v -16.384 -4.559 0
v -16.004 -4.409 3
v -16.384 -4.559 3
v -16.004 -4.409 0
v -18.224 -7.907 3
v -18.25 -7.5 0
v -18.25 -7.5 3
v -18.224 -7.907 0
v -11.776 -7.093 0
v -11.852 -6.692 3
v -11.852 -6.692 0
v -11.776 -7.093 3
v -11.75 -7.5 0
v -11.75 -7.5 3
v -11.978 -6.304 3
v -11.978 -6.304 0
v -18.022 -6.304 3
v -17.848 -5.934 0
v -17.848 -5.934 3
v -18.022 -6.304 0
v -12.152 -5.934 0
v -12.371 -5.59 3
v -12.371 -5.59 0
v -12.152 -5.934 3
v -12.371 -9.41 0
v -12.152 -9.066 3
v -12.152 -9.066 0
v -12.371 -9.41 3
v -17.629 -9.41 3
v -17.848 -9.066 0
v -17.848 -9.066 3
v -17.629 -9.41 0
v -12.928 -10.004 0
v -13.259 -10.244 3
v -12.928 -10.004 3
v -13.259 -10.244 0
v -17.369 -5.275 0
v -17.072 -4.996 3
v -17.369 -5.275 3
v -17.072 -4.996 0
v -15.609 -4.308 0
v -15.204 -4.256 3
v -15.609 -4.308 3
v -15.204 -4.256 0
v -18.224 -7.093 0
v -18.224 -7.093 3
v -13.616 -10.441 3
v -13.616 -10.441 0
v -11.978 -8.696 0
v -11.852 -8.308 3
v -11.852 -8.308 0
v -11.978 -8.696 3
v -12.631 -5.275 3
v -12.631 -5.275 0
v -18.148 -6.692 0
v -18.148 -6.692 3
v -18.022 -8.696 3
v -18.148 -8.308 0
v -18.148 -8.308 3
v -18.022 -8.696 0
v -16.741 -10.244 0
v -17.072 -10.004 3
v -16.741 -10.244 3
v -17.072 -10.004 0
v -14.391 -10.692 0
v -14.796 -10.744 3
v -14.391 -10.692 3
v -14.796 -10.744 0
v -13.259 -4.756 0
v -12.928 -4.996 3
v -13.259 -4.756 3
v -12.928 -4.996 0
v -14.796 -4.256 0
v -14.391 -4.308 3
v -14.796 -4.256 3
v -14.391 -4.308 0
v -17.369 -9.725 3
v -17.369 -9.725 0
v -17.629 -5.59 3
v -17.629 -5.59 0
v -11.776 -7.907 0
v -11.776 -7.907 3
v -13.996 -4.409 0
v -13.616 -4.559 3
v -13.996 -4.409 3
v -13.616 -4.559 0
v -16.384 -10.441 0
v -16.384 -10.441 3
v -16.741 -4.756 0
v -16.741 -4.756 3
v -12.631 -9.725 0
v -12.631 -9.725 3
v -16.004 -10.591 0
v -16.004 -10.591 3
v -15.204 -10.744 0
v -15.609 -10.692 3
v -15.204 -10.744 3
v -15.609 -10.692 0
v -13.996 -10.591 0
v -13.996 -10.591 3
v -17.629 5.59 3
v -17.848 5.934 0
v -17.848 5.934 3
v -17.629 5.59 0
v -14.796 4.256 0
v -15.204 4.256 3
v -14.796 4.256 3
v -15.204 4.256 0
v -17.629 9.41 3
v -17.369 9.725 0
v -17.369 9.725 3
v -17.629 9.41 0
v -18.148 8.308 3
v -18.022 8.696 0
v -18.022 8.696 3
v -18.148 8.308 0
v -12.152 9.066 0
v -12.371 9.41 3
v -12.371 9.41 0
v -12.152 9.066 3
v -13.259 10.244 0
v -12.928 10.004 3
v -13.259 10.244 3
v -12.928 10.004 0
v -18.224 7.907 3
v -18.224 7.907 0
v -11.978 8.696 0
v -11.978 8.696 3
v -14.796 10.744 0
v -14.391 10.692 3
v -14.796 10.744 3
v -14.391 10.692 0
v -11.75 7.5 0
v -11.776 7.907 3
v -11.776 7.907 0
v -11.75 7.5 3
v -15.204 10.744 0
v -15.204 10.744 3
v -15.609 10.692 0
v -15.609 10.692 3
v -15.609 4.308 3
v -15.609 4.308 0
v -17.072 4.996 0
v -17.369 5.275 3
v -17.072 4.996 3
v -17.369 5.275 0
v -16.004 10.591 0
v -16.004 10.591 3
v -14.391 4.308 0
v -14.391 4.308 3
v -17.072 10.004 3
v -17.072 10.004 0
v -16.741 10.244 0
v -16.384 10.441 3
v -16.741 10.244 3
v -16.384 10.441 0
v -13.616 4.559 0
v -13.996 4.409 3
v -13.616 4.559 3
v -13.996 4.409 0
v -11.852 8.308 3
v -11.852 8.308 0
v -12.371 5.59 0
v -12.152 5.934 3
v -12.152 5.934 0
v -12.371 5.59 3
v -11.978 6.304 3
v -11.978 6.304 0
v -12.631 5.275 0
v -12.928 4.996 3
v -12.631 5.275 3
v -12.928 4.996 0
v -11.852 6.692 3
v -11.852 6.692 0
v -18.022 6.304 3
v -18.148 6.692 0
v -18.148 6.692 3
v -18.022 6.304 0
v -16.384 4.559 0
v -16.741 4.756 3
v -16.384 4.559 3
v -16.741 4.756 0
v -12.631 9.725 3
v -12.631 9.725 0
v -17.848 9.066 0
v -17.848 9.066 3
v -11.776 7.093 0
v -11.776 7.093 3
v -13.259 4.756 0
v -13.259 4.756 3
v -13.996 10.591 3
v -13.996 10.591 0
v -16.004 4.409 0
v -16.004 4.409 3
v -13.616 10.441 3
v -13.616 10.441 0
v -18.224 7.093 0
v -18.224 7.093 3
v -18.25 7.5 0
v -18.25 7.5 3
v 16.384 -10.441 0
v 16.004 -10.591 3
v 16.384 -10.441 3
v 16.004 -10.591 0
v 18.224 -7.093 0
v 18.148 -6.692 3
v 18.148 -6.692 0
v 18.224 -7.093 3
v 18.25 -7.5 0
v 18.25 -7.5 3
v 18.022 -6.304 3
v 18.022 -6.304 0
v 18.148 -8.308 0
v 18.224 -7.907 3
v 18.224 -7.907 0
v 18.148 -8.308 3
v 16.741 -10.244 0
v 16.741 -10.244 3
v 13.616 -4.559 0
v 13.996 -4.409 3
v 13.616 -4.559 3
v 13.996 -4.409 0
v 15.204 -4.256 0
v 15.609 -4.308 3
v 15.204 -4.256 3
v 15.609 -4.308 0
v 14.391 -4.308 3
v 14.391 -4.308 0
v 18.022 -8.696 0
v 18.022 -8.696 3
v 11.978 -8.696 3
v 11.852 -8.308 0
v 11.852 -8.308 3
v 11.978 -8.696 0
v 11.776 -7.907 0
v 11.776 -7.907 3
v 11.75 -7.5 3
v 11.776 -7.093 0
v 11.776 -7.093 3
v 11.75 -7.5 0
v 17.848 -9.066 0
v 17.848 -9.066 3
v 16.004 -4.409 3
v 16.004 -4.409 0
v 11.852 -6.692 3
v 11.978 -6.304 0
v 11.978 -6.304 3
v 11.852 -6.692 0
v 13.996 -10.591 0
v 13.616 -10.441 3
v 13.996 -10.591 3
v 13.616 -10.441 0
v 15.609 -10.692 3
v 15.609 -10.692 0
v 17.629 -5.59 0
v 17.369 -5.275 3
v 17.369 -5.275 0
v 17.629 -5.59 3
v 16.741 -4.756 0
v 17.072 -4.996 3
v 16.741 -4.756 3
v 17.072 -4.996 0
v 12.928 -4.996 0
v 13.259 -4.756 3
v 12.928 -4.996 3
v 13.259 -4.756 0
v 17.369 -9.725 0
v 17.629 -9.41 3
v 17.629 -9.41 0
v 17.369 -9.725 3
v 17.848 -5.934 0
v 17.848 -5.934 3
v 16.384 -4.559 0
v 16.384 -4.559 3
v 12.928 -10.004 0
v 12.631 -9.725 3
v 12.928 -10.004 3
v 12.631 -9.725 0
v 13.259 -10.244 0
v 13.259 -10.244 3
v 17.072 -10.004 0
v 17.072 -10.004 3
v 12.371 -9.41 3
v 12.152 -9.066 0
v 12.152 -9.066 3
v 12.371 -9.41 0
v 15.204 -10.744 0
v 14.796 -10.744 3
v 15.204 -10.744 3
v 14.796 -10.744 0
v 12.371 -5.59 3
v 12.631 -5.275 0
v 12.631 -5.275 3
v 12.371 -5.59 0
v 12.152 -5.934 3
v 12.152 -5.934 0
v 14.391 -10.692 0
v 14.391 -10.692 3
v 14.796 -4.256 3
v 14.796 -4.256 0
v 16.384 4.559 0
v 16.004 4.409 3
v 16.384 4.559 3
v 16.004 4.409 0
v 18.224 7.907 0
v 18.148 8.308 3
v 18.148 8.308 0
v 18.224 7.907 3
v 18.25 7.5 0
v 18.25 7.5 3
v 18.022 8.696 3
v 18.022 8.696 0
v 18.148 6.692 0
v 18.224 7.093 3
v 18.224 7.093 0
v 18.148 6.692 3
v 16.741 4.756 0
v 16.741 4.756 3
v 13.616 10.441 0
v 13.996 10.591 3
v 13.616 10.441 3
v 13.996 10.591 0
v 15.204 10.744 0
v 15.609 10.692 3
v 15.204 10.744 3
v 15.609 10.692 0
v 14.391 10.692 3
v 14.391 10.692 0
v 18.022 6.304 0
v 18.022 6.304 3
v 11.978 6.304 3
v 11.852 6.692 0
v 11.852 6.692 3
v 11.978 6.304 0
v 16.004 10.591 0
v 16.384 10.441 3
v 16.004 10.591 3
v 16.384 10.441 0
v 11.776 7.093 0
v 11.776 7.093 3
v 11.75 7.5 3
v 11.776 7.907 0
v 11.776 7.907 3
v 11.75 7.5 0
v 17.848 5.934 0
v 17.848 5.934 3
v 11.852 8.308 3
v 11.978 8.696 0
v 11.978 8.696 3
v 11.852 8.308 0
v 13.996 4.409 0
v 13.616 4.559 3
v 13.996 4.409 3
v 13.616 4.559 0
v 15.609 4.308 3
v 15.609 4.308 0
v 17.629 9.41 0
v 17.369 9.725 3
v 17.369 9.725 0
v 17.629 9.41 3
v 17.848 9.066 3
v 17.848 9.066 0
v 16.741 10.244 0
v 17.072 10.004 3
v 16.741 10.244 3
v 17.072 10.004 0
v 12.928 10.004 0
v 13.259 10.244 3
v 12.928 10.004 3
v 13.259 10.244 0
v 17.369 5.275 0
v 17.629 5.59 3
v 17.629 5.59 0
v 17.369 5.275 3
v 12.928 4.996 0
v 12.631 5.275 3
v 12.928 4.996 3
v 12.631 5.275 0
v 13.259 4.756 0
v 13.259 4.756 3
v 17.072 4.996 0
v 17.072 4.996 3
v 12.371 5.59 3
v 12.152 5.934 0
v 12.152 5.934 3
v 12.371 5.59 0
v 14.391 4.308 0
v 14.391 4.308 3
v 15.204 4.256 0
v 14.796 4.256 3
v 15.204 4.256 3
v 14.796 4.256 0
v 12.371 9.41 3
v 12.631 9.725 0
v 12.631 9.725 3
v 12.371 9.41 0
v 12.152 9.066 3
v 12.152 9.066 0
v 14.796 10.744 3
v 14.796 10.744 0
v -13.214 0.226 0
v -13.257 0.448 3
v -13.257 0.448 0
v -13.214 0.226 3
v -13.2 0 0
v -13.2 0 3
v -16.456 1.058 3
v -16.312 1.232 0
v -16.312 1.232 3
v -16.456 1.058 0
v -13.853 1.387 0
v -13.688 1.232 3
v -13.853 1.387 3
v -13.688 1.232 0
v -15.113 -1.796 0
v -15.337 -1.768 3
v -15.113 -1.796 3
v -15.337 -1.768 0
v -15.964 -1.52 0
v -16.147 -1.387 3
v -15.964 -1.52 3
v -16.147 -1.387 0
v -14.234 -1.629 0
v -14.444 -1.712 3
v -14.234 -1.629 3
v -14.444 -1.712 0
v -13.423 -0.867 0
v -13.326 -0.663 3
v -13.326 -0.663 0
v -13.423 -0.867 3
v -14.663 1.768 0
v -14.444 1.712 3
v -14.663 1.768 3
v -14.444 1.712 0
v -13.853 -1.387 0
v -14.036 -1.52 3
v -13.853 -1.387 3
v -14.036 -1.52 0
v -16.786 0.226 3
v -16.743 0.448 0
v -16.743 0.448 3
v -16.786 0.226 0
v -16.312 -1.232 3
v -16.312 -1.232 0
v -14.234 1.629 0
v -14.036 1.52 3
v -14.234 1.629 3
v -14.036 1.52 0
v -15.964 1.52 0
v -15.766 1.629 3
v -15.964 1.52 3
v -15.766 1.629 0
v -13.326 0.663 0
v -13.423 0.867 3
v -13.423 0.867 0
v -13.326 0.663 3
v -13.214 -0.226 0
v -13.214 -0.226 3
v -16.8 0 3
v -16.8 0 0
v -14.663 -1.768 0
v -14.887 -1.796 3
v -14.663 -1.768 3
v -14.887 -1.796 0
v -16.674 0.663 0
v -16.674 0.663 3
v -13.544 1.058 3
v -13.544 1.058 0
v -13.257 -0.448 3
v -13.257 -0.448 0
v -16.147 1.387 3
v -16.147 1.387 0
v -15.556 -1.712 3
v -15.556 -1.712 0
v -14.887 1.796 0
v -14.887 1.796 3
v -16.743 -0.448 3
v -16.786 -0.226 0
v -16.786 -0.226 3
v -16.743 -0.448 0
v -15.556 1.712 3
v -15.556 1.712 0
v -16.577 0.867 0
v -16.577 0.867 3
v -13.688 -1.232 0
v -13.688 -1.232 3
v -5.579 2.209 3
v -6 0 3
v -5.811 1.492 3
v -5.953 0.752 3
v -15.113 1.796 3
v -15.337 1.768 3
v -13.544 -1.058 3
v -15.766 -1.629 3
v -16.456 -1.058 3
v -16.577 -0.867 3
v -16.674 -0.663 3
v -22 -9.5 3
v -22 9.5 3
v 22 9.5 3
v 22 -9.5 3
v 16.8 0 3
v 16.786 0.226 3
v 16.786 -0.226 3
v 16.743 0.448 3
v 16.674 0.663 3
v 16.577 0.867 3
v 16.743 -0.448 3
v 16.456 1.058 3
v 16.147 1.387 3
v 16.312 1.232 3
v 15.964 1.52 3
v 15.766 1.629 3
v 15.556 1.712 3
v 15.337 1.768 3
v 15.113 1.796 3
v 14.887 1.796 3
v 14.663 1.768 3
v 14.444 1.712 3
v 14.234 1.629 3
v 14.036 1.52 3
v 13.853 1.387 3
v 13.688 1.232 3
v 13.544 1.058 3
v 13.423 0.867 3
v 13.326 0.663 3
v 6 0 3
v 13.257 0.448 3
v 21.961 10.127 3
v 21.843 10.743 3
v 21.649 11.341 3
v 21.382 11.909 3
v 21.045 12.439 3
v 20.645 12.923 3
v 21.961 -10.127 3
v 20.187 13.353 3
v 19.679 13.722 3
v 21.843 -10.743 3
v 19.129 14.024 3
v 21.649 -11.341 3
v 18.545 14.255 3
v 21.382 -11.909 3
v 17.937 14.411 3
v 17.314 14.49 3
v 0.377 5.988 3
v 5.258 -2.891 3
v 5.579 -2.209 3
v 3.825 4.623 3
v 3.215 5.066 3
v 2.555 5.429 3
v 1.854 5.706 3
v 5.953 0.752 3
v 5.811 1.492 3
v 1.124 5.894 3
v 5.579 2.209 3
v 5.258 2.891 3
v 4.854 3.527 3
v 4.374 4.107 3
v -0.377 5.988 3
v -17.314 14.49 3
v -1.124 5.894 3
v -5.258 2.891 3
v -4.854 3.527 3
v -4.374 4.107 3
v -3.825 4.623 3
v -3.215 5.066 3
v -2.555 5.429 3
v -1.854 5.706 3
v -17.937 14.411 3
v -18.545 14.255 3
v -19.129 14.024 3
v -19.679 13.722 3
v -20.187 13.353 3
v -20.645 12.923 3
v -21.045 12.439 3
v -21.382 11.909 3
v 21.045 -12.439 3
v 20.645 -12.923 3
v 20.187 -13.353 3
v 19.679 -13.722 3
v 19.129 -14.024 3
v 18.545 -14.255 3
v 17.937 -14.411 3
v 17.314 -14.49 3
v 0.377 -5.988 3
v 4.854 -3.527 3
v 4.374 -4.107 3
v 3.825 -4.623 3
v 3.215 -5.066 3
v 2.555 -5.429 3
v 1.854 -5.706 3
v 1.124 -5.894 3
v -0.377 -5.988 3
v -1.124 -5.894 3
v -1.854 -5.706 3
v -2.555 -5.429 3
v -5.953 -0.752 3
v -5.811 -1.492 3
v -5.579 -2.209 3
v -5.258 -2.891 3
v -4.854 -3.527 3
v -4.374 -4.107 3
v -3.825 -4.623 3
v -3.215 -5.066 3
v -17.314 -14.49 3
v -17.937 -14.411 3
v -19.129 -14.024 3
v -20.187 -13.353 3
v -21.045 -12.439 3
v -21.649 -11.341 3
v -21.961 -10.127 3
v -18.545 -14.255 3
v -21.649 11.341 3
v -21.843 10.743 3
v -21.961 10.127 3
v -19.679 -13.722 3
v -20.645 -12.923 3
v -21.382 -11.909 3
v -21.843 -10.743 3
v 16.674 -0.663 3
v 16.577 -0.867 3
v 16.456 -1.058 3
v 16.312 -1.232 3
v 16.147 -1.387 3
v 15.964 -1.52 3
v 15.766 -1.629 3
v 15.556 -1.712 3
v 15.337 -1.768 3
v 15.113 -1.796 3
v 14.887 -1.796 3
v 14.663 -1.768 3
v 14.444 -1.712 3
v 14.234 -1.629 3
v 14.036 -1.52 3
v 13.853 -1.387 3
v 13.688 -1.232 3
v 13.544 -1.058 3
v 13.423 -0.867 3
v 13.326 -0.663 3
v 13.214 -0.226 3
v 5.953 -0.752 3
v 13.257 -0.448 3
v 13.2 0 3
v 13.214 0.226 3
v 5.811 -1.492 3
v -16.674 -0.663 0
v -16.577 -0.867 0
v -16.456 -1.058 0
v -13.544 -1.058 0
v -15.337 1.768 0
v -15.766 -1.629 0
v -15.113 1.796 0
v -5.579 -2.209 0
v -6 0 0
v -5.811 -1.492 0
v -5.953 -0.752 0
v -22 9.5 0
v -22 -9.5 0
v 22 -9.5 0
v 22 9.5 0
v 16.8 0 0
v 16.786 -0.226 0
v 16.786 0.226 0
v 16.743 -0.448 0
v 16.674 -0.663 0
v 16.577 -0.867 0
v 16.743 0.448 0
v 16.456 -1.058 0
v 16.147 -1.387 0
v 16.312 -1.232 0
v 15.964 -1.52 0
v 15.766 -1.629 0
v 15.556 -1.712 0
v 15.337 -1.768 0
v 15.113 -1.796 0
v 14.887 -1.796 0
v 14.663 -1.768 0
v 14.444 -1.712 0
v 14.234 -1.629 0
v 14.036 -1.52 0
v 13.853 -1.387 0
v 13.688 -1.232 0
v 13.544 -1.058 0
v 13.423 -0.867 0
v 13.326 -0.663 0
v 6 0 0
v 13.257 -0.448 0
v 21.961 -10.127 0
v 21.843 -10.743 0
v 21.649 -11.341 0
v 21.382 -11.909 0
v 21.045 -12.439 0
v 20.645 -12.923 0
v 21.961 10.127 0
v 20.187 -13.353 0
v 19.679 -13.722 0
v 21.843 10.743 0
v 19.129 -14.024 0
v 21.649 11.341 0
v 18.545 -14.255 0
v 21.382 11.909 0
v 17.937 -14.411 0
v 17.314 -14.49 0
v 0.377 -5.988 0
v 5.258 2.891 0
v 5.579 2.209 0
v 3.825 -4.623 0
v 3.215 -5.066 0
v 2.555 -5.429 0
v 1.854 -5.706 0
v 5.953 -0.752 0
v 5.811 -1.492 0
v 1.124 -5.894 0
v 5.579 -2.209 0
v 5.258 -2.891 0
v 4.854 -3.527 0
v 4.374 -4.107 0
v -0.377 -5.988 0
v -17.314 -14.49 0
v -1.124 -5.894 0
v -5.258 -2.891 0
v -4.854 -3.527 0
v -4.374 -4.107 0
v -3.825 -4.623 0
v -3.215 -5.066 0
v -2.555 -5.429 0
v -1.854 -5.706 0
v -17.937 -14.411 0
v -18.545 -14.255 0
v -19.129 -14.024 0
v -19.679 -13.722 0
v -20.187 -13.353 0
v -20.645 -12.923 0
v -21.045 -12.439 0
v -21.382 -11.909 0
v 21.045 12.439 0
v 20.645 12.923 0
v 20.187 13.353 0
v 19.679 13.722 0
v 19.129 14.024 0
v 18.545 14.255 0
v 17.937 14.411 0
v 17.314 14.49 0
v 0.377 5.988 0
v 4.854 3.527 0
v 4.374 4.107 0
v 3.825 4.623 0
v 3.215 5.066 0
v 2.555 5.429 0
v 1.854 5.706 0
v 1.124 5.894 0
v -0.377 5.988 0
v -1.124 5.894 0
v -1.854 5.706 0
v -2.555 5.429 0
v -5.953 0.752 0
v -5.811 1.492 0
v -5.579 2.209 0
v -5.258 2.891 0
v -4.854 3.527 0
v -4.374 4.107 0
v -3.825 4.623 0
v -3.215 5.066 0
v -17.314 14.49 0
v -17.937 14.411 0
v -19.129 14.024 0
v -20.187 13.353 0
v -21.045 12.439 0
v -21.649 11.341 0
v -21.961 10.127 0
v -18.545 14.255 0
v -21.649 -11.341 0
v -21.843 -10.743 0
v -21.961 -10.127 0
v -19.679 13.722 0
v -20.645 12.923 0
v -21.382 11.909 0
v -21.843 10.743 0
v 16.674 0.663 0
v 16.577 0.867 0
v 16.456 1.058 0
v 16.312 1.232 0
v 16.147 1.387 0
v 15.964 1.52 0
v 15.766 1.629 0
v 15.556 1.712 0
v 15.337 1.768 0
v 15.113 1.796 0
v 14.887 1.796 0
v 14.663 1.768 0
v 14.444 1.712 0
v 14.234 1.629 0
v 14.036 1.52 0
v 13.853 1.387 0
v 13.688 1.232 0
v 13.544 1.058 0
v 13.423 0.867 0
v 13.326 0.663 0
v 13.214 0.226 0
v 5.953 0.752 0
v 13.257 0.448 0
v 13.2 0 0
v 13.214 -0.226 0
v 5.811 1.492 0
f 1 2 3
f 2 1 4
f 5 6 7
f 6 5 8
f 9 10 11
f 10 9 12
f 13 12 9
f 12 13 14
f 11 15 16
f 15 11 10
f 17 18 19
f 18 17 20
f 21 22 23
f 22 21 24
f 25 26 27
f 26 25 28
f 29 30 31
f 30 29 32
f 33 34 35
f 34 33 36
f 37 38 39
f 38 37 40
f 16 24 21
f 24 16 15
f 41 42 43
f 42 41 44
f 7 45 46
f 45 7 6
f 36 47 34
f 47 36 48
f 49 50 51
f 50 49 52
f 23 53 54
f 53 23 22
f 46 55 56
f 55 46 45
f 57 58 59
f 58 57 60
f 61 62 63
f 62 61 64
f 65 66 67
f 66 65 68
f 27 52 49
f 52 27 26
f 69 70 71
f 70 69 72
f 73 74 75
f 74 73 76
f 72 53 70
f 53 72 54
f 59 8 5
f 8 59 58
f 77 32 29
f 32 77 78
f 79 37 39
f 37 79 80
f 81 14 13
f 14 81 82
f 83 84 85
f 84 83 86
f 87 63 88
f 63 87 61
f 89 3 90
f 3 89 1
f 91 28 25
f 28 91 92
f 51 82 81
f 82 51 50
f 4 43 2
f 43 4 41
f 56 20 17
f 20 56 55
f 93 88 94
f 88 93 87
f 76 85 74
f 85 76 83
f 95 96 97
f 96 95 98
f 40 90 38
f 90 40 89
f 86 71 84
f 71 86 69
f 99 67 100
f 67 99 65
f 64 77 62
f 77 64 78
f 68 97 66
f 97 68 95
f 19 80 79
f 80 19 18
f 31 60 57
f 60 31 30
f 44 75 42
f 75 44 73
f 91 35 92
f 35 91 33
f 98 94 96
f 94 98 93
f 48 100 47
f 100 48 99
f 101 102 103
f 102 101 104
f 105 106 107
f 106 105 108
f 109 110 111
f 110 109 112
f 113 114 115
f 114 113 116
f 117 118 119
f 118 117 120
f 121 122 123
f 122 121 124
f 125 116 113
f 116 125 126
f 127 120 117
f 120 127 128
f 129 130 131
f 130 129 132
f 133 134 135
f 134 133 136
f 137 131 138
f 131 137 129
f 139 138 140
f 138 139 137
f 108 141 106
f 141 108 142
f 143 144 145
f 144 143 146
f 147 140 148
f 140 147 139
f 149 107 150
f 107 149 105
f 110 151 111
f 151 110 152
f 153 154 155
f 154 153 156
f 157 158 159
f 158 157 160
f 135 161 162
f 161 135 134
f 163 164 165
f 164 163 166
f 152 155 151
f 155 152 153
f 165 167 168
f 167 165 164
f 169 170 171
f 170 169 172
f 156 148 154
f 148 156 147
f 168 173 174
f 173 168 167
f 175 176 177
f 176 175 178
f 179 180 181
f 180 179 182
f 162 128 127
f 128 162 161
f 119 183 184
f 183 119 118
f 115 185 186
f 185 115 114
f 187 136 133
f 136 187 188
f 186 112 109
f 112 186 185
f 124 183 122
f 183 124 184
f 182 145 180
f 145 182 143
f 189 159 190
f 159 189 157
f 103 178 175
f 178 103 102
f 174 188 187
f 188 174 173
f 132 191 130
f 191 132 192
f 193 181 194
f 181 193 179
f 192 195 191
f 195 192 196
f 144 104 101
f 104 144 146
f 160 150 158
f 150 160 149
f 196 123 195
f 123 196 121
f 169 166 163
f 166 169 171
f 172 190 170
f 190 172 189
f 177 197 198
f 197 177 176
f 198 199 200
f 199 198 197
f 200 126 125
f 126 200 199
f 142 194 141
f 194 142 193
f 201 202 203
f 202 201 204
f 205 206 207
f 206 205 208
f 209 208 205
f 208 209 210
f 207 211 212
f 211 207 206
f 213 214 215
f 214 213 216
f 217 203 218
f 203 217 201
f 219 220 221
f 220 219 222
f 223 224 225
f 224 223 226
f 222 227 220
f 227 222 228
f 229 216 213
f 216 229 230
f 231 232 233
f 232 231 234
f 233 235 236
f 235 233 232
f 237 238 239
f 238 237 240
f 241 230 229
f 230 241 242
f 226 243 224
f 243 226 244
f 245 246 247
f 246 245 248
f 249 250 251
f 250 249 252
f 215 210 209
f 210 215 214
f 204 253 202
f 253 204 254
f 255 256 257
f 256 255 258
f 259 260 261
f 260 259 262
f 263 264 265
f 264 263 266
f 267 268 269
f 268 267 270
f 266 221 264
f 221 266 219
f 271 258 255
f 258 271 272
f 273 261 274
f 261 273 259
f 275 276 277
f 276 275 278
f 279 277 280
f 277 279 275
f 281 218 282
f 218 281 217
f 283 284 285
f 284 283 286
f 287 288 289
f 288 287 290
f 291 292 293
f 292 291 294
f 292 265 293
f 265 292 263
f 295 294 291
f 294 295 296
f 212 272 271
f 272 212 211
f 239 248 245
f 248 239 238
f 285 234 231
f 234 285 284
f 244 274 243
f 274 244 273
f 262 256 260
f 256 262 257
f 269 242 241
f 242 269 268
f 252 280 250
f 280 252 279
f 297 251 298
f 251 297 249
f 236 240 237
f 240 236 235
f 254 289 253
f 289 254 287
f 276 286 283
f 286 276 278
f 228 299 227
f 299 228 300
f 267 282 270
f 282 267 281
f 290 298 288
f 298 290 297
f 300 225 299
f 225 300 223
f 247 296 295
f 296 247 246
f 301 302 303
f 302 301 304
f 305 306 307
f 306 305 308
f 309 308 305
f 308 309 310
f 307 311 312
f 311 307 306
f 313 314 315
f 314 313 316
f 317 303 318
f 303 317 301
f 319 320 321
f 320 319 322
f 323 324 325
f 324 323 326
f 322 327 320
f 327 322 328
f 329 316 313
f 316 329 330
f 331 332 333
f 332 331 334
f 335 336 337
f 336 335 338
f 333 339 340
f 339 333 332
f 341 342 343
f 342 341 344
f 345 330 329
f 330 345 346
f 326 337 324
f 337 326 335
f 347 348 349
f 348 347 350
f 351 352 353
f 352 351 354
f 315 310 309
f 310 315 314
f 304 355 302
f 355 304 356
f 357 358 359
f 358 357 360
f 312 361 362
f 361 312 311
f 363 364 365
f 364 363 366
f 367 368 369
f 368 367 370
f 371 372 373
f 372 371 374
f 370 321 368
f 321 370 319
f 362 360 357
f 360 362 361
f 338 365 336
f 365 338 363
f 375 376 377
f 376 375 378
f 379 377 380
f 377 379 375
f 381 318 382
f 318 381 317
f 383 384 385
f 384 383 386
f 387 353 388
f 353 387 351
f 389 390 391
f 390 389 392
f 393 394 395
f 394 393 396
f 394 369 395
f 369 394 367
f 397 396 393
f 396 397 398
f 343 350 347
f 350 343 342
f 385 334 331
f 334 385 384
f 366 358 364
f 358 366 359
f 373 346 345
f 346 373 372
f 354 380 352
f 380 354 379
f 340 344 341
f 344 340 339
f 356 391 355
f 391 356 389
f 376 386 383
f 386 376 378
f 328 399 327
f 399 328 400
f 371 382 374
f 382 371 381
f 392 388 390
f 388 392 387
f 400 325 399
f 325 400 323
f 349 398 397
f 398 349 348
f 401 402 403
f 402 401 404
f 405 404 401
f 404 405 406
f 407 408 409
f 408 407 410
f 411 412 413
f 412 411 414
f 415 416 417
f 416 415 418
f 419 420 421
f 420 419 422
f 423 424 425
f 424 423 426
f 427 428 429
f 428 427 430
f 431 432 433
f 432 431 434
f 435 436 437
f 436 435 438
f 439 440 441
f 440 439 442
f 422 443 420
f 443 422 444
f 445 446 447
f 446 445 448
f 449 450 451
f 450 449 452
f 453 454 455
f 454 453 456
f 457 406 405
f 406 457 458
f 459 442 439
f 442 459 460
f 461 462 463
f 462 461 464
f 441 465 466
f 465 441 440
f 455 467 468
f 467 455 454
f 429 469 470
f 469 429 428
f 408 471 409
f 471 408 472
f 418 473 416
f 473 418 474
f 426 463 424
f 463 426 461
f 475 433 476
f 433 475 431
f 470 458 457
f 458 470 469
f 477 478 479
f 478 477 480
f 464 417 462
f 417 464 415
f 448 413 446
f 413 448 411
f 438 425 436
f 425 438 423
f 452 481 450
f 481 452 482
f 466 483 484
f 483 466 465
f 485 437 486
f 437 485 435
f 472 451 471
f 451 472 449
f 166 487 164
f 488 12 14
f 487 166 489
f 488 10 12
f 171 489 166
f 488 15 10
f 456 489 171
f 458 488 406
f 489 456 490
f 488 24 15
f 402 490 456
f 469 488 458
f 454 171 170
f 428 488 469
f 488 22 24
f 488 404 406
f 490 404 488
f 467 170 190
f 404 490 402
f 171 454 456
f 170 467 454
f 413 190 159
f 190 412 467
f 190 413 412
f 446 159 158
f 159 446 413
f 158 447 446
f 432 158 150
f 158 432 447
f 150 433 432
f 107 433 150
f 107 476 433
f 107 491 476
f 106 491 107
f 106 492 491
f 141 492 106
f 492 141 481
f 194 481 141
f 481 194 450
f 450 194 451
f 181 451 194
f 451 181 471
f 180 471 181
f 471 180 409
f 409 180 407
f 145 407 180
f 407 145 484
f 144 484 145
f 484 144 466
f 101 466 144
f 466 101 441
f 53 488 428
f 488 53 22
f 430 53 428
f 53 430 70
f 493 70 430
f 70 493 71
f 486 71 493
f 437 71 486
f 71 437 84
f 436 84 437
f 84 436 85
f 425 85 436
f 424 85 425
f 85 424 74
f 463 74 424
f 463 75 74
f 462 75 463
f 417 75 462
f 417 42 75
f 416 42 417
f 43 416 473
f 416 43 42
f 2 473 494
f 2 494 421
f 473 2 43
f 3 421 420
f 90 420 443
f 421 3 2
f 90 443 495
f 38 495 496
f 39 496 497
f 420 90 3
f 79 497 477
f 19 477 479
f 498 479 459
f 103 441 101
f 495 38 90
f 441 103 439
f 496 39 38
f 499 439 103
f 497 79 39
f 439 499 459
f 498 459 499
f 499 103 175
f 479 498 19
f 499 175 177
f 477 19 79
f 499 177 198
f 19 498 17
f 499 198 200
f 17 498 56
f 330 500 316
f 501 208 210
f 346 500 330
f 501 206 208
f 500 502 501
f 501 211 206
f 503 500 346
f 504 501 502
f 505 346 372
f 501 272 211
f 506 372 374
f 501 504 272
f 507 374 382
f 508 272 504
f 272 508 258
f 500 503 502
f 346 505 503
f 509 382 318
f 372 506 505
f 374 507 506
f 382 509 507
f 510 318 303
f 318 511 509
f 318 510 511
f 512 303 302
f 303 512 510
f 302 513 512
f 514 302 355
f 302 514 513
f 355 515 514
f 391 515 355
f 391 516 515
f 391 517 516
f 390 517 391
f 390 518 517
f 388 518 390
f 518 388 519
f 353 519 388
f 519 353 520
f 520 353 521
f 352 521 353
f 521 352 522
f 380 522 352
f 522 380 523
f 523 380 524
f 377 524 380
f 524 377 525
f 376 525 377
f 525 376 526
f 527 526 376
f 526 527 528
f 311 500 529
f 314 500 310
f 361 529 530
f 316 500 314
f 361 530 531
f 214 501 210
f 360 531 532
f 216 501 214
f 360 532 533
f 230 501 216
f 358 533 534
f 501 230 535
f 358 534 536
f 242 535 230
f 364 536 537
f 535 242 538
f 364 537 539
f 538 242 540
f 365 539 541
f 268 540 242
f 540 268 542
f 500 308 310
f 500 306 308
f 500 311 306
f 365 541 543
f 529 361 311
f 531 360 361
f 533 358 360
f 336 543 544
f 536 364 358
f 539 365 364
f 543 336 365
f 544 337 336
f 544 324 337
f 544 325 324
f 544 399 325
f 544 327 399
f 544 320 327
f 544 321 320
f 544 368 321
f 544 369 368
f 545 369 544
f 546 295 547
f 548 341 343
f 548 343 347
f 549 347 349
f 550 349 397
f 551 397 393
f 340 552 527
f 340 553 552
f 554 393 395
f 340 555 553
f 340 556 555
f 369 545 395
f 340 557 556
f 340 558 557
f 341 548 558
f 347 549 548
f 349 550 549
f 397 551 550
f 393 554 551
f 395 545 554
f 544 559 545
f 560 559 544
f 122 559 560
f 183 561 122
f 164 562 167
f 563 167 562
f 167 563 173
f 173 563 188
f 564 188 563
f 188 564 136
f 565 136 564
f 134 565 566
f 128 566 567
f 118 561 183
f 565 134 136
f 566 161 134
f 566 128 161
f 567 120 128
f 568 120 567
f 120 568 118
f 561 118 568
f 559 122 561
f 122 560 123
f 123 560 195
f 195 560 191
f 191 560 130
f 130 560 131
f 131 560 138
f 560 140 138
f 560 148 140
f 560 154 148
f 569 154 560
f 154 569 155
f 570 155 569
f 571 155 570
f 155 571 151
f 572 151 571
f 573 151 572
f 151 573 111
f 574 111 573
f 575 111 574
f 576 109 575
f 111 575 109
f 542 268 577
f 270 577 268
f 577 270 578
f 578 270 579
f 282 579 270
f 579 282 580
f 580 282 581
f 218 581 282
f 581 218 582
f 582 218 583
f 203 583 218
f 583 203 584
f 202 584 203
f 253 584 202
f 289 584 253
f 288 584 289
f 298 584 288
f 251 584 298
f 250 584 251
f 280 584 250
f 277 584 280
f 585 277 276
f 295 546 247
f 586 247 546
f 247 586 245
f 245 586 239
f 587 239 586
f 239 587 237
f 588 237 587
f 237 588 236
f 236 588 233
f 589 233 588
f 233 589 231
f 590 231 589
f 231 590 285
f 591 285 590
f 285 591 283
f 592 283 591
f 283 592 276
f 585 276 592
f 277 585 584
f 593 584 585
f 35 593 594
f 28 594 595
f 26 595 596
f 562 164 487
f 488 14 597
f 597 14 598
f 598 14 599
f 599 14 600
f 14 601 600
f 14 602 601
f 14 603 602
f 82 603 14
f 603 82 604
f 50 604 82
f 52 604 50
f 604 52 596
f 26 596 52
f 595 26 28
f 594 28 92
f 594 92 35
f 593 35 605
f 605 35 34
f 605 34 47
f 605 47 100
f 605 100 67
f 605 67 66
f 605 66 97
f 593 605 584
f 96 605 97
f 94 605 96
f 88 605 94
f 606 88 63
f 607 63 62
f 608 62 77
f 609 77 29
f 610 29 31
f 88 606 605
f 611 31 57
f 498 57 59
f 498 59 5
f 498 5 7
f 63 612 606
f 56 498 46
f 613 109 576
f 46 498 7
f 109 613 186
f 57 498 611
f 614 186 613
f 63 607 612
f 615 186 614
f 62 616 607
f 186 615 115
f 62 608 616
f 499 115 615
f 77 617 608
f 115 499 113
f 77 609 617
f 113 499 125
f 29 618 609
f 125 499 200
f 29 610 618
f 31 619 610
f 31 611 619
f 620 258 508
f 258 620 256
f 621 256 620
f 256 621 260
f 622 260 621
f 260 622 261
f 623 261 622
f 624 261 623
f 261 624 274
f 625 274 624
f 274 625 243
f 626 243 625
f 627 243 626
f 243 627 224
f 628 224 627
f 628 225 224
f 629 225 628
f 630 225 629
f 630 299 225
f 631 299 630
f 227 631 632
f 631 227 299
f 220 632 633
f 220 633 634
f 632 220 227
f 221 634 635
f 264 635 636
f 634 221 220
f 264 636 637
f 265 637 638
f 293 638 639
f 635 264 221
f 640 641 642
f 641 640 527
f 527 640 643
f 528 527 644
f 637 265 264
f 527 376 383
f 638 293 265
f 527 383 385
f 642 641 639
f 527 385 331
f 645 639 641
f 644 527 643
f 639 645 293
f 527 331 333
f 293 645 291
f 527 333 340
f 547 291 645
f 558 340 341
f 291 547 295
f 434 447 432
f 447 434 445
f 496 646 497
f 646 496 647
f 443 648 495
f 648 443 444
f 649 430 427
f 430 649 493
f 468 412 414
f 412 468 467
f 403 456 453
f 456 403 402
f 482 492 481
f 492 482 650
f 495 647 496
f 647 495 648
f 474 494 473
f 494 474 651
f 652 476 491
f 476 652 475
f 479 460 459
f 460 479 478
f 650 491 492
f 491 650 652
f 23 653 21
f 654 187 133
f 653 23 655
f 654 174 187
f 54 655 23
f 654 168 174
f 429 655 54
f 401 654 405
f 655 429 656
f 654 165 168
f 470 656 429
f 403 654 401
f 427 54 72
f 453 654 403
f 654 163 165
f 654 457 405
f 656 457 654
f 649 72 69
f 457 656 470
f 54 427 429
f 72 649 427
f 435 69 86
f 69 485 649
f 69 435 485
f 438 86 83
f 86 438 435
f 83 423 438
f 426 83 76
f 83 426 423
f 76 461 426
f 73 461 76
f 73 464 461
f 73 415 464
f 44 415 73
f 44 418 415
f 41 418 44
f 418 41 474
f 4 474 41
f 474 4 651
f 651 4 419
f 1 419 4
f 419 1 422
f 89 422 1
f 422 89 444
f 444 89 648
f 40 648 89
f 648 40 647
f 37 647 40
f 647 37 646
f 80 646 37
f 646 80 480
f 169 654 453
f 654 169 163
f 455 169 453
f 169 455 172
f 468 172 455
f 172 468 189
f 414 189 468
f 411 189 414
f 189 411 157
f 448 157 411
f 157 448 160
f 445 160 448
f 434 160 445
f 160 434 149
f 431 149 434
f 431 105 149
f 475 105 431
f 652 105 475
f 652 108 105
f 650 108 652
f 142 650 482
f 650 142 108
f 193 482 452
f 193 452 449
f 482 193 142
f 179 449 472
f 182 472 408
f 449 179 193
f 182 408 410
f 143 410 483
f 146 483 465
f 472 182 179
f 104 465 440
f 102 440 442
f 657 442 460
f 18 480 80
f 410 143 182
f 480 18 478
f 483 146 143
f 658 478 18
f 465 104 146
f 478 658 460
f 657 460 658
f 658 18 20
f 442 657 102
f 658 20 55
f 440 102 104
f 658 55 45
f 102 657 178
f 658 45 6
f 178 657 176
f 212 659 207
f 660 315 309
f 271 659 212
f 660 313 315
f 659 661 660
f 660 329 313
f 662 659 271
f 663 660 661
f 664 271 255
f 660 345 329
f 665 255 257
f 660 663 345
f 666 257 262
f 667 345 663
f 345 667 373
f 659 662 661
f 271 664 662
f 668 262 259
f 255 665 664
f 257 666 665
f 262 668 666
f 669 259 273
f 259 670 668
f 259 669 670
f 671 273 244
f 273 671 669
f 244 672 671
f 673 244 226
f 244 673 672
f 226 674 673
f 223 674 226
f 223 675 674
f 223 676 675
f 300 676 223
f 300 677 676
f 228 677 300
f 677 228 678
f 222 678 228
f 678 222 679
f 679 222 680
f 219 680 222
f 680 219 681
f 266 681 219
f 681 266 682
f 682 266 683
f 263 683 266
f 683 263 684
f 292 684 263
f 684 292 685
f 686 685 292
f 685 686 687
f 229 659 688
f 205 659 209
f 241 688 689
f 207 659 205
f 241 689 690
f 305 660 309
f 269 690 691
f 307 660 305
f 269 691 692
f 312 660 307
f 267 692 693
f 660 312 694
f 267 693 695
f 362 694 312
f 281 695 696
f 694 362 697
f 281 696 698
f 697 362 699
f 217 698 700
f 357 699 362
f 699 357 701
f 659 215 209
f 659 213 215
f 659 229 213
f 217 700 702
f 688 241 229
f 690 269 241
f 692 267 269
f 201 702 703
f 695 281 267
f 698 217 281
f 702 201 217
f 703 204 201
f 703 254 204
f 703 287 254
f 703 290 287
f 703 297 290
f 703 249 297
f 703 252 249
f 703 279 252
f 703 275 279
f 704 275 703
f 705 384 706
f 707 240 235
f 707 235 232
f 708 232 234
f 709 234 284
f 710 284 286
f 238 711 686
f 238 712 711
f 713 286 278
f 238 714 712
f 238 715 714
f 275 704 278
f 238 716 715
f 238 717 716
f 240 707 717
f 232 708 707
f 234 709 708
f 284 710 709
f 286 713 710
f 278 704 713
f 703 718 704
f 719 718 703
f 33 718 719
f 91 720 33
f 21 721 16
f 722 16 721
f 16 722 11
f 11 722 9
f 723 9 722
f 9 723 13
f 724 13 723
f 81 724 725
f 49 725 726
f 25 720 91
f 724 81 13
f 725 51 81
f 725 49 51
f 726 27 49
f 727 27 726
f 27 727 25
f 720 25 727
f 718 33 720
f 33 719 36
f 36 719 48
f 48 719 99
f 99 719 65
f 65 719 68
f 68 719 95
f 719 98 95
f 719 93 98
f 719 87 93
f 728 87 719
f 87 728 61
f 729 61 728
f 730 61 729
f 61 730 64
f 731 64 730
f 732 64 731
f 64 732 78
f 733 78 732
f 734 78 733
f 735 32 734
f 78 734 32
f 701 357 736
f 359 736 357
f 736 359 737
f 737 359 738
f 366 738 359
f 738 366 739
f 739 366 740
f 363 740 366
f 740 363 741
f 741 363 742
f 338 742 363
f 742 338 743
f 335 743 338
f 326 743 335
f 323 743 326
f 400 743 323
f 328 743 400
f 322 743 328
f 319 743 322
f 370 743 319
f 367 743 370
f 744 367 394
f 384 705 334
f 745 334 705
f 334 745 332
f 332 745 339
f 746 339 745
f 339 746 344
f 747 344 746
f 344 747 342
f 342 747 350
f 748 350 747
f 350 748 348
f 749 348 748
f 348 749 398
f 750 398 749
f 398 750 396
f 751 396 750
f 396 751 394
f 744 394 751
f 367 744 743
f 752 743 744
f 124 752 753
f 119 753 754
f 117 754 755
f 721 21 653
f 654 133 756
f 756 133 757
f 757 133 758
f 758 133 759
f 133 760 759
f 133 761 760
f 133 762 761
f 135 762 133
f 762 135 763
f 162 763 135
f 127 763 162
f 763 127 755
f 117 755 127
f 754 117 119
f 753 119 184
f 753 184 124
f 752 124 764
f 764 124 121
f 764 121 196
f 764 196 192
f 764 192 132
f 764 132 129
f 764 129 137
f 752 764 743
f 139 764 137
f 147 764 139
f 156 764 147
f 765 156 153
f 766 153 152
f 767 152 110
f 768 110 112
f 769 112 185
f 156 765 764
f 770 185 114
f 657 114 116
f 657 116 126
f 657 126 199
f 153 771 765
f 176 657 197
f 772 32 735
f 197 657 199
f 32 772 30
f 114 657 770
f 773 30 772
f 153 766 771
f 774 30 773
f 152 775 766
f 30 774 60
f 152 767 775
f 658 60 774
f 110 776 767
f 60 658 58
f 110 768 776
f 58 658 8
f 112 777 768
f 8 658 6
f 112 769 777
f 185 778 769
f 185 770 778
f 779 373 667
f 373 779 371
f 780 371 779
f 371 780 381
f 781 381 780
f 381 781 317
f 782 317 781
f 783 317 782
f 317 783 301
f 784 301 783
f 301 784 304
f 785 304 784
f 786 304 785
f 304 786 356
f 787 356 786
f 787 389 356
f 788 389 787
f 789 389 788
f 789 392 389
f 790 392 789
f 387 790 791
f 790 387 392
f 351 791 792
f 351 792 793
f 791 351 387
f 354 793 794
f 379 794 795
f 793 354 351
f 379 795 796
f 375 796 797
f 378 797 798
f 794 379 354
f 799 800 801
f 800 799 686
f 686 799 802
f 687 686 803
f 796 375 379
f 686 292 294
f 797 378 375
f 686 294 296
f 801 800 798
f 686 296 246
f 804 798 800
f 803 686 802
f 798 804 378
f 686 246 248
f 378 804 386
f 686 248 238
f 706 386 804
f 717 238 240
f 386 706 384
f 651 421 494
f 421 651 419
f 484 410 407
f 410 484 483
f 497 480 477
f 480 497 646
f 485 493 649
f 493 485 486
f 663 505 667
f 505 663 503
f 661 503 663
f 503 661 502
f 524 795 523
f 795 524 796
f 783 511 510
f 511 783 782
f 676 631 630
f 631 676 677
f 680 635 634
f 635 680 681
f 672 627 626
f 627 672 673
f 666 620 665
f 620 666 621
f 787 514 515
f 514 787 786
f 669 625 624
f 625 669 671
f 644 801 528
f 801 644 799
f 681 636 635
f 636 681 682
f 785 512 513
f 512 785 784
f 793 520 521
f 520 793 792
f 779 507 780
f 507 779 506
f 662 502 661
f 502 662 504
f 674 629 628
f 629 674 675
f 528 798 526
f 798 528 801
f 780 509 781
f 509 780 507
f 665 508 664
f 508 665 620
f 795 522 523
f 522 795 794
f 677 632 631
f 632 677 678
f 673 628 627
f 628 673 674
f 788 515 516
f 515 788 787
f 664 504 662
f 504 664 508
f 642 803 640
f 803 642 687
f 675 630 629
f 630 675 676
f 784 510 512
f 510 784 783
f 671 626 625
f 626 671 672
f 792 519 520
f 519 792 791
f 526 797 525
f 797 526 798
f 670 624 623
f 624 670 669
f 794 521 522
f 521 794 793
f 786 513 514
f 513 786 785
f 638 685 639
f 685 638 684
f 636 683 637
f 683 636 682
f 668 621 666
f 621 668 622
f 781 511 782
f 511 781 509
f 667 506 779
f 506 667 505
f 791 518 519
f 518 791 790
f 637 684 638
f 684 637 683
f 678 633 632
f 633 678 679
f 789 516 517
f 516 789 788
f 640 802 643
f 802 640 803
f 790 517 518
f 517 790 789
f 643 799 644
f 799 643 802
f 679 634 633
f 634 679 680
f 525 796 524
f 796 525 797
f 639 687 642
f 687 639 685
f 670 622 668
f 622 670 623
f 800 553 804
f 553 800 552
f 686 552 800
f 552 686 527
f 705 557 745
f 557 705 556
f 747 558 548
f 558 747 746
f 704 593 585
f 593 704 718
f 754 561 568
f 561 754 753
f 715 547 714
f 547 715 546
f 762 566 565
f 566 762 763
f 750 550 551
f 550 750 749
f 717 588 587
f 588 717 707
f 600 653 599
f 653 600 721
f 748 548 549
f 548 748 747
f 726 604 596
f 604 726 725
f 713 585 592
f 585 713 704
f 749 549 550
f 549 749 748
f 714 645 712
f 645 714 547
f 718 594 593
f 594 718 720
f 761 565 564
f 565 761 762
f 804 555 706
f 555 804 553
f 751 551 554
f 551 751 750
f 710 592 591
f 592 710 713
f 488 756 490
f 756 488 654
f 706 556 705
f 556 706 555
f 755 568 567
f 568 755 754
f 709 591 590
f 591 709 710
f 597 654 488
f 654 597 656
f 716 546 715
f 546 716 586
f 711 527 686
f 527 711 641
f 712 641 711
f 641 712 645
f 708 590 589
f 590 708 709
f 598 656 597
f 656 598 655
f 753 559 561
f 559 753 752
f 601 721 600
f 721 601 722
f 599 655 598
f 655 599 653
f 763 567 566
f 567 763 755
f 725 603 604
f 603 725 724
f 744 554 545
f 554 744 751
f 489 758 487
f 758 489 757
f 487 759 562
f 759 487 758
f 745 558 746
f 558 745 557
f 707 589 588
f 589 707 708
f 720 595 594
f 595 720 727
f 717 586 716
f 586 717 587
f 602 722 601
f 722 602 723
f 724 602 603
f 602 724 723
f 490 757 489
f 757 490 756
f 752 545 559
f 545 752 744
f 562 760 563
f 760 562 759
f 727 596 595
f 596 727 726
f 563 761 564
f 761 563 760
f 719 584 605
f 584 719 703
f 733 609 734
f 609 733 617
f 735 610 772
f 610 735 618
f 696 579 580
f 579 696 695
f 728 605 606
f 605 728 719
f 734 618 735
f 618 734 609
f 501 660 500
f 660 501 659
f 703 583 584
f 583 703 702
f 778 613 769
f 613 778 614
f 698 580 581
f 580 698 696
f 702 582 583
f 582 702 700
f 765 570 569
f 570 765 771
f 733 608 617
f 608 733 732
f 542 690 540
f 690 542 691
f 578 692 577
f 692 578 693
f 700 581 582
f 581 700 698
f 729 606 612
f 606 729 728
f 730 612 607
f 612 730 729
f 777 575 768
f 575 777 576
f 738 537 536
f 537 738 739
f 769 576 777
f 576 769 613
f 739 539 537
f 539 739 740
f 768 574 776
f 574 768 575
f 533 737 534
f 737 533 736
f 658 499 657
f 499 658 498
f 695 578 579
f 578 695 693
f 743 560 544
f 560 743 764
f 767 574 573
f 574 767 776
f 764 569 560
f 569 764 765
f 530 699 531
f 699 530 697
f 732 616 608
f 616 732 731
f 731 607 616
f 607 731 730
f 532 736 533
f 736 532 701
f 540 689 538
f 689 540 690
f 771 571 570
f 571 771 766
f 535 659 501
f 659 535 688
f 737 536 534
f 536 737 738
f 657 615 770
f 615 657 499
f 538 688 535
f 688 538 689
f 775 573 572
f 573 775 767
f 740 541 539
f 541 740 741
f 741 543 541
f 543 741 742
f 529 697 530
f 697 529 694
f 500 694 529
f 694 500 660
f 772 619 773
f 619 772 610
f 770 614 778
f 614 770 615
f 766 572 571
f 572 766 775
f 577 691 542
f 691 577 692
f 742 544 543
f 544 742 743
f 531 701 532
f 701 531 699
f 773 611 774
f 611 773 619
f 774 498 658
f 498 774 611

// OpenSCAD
$fn = 50;


difference() {
	union() {
		hull() {
			translate(v = [-17.0000000000, 9.5000000000, 0]) {
				cylinder(h = 3, r = 5);
			}
			translate(v = [17.0000000000, 9.5000000000, 0]) {
				cylinder(h = 3, r = 5);
			}
			translate(v = [-17.0000000000, -9.5000000000, 0]) {
				cylinder(h = 3, r = 5);
			}
			translate(v = [17.0000000000, -9.5000000000, 0]) {
				cylinder(h = 3, r = 5);
			}
		}
	}
	union() {
		#translate(v = [-15.0000000000, -7.5000000000, 0]) {
			cylinder(h = 3, r = 3.2500000000);
		}
		#translate(v = [-15.0000000000, 7.5000000000, 0]) {
			cylinder(h = 3, r = 3.2500000000);
		}
		#translate(v = [15.0000000000, -7.5000000000, 0]) {
			cylinder(h = 3, r = 3.2500000000);
		}
		#translate(v = [15.0000000000, 7.5000000000, 0]) {
			cylinder(h = 3, r = 3.2500000000);
		}
		#translate(v = [-15.0000000000, -7.5000000000, -100.0000000000]) {
			cylinder(h = 200, r = 3.2500000000);
		}
		#translate(v = [-15.0000000000, 7.5000000000, -100.0000000000]) {
			cylinder(h = 200, r = 3.2500000000);
		}
		#translate(v = [15.0000000000, -7.5000000000, -100.0000000000]) {
			cylinder(h = 200, r = 3.2500000000);
		}
		#translate(v = [15.0000000000, 7.5000000000, -100.0000000000]) {
			cylinder(h = 200, r = 3.2500000000);
		}
		#translate(v = [-15.0000000000, -7.5000000000, 0]) {
			cylinder(h = 3, r = 1.8000000000);
		}
		#translate(v = [-15.0000000000, 0.0000000000, 0]) {
			cylinder(h = 3, r = 1.8000000000);
		}
		#translate(v = [-15.0000000000, 7.5000000000, 0]) {
			cylinder(h = 3, r = 1.8000000000);
		}
		#translate(v = [15.0000000000, -7.5000000000, 0]) {
			cylinder(h = 3, r = 1.8000000000);
		}
		#translate(v = [15.0000000000, 0.0000000000, 0]) {
			cylinder(h = 3, r = 1.8000000000);
		}
		#translate(v = [15.0000000000, 7.5000000000, 0]) {
			cylinder(h = 3, r = 1.8000000000);
		}
		#translate(v = [-15.0000000000, -7.5000000000, 0]) {
			cylinder(h = 3, r = 1.8000000000);
		}
		#translate(v = [-15.0000000000, 0.0000000000, 0]) {
			cylinder(h = 3, r = 1.8000000000);
		}
		#translate(v = [-15.0000000000, 7.5000000000, 0]) {
			cylinder(h = 3, r = 1.8000000000);
		}
		#translate(v = [15.0000000000, -7.5000000000, 0]) {
			cylinder(h = 3, r = 1.8000000000);
		}
		#translate(v = [15.0000000000, 0.0000000000, 0]) {
			cylinder(h = 3, r = 1.8000000000);
		}
		#translate(v = [15.0000000000, 7.5000000000, 0]) {
			cylinder(h = 3, r = 1.8000000000);
		}
		#translate(v = [-15.0000000000, -7.5000000000, 0]) {
			cylinder(h = 3, r = 1.8000000000);
		}
		#translate(v = [-15.0000000000, 0.0000000000, 0]) {
			cylinder(h = 3, r = 1.8000000000);
		}
		#translate(v = [-15.0000000000, 7.5000000000, 0]) {
			cylinder(h = 3, r = 1.8000000000);
		}
		#translate(v = [15.0000000000, -7.5000000000, 0]) {
			cylinder(h = 3, r = 1.8000000000);
		}
		#translate(v = [15.0000000000, 0.0000000000, 0]) {
			cylinder(h = 3, r = 1.8000000000);
		}
		#translate(v = [15.0000000000, 7.5000000000, 0]) {
			cylinder(h = 3, r = 1.8000000000);
		}
		#cylinder(h = 3, r = 6.0000000000);
	}
}
